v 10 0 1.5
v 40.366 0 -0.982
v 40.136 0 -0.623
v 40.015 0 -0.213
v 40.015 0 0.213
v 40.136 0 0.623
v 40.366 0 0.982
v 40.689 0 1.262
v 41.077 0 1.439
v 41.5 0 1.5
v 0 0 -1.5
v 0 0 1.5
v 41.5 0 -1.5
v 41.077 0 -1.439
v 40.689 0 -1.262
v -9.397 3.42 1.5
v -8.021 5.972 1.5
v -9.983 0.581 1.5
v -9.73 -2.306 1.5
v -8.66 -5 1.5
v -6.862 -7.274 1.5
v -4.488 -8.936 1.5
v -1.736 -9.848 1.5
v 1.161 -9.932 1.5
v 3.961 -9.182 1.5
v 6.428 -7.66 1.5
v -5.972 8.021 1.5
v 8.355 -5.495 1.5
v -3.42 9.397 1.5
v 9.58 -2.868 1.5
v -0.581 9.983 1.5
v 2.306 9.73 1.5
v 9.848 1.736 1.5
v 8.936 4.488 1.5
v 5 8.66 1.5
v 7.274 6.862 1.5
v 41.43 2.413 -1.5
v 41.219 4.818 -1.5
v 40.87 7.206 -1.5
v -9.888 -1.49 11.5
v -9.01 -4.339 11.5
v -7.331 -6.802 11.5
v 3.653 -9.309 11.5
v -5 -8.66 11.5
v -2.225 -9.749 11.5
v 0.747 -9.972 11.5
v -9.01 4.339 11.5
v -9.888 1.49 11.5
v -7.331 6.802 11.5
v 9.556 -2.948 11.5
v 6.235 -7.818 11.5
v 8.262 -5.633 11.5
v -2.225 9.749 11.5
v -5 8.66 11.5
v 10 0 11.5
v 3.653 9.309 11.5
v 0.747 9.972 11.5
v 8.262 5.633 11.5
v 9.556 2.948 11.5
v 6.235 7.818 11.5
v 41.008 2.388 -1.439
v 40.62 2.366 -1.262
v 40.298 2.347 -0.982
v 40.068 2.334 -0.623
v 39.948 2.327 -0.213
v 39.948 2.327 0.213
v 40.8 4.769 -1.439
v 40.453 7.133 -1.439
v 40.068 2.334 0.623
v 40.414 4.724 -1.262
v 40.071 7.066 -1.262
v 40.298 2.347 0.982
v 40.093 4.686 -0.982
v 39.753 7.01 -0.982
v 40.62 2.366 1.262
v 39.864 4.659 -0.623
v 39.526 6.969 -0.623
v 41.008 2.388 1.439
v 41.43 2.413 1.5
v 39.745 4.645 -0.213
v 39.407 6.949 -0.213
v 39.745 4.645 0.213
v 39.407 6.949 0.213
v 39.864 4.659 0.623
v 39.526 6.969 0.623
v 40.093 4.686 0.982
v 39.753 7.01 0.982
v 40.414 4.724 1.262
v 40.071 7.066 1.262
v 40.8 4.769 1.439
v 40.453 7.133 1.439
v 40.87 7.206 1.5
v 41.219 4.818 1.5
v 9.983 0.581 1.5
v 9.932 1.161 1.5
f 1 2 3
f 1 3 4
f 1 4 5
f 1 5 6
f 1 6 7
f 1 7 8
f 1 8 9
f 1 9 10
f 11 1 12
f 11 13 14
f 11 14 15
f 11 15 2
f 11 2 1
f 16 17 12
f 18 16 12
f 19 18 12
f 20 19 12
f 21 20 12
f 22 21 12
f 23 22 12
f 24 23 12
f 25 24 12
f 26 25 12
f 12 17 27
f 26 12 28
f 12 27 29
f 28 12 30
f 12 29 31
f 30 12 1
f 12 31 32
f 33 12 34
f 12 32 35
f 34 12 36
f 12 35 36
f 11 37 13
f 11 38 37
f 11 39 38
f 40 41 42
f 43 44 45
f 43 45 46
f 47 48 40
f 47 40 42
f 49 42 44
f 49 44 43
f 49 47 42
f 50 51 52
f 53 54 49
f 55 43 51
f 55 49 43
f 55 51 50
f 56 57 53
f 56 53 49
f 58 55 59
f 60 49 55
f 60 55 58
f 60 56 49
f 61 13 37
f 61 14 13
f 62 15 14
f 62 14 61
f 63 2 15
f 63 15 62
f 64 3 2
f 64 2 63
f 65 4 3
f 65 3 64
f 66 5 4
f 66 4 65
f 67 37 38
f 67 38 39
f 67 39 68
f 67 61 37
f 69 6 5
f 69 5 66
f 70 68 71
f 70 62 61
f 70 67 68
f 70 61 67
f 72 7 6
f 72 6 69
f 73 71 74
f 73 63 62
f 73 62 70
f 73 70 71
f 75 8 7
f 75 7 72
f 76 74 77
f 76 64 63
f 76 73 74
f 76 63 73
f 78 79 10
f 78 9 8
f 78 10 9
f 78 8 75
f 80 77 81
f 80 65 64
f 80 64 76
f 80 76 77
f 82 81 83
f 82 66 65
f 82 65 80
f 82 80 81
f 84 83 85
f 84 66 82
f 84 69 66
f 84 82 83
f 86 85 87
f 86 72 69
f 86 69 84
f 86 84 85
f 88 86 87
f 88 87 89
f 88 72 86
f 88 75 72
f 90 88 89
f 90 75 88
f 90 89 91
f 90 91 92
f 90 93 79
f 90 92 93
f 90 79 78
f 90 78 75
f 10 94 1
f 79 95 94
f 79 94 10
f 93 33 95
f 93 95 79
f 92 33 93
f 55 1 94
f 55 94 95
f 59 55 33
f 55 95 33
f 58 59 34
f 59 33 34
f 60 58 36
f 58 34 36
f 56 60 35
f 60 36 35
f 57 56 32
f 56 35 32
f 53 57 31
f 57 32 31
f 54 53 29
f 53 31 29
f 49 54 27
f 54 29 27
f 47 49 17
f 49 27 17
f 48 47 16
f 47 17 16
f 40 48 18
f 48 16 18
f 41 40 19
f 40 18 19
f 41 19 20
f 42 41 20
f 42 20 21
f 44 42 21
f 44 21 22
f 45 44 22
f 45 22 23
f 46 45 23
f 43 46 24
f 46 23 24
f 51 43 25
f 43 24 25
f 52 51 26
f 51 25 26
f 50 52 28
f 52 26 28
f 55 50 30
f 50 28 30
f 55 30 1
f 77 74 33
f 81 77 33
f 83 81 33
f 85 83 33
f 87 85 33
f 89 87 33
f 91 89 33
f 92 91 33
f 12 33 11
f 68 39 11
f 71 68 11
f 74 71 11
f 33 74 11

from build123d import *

# Parameters (mm, degrees)
REVOLVE2_ANGLE      = 10
SKETCH2_R           = 10
BOSS_EXTRUDE1_DEPTH = 10


with BuildPart() as part:
    # Sketch1 → Revolve2 (revolve)
    with BuildSketch(Plane(origin=(0, 0, 0), x_dir=(1, 0, 0), z_dir=(0, 1, 0))):
        with BuildLine():
            Line((40, 1.5), (41.5, 1.5))
            ThreePointArc((41.5, 1.5), (40, 0), (41.5, -1.5))
            Line((41.5, -1.5), (40, -1.5))
            Line((40, -1.5), (0, -1.5))
            Line((0, -1.5), (0, 1.5))
            Line((0, 1.5), (40, 1.5))
        make_face()
    revolve(axis=Axis((0, 0, -1.5), (0, 0, 1)), revolution_arc=REVOLVE2_ANGLE)

    # Sketch2 → Boss-Extrude1 (add)
    with BuildSketch(Plane.XY.offset(1.5)):
        Circle(SKETCH2_R)
    extrude(amount=BOSS_EXTRUDE1_DEPTH)


solid = part.part
